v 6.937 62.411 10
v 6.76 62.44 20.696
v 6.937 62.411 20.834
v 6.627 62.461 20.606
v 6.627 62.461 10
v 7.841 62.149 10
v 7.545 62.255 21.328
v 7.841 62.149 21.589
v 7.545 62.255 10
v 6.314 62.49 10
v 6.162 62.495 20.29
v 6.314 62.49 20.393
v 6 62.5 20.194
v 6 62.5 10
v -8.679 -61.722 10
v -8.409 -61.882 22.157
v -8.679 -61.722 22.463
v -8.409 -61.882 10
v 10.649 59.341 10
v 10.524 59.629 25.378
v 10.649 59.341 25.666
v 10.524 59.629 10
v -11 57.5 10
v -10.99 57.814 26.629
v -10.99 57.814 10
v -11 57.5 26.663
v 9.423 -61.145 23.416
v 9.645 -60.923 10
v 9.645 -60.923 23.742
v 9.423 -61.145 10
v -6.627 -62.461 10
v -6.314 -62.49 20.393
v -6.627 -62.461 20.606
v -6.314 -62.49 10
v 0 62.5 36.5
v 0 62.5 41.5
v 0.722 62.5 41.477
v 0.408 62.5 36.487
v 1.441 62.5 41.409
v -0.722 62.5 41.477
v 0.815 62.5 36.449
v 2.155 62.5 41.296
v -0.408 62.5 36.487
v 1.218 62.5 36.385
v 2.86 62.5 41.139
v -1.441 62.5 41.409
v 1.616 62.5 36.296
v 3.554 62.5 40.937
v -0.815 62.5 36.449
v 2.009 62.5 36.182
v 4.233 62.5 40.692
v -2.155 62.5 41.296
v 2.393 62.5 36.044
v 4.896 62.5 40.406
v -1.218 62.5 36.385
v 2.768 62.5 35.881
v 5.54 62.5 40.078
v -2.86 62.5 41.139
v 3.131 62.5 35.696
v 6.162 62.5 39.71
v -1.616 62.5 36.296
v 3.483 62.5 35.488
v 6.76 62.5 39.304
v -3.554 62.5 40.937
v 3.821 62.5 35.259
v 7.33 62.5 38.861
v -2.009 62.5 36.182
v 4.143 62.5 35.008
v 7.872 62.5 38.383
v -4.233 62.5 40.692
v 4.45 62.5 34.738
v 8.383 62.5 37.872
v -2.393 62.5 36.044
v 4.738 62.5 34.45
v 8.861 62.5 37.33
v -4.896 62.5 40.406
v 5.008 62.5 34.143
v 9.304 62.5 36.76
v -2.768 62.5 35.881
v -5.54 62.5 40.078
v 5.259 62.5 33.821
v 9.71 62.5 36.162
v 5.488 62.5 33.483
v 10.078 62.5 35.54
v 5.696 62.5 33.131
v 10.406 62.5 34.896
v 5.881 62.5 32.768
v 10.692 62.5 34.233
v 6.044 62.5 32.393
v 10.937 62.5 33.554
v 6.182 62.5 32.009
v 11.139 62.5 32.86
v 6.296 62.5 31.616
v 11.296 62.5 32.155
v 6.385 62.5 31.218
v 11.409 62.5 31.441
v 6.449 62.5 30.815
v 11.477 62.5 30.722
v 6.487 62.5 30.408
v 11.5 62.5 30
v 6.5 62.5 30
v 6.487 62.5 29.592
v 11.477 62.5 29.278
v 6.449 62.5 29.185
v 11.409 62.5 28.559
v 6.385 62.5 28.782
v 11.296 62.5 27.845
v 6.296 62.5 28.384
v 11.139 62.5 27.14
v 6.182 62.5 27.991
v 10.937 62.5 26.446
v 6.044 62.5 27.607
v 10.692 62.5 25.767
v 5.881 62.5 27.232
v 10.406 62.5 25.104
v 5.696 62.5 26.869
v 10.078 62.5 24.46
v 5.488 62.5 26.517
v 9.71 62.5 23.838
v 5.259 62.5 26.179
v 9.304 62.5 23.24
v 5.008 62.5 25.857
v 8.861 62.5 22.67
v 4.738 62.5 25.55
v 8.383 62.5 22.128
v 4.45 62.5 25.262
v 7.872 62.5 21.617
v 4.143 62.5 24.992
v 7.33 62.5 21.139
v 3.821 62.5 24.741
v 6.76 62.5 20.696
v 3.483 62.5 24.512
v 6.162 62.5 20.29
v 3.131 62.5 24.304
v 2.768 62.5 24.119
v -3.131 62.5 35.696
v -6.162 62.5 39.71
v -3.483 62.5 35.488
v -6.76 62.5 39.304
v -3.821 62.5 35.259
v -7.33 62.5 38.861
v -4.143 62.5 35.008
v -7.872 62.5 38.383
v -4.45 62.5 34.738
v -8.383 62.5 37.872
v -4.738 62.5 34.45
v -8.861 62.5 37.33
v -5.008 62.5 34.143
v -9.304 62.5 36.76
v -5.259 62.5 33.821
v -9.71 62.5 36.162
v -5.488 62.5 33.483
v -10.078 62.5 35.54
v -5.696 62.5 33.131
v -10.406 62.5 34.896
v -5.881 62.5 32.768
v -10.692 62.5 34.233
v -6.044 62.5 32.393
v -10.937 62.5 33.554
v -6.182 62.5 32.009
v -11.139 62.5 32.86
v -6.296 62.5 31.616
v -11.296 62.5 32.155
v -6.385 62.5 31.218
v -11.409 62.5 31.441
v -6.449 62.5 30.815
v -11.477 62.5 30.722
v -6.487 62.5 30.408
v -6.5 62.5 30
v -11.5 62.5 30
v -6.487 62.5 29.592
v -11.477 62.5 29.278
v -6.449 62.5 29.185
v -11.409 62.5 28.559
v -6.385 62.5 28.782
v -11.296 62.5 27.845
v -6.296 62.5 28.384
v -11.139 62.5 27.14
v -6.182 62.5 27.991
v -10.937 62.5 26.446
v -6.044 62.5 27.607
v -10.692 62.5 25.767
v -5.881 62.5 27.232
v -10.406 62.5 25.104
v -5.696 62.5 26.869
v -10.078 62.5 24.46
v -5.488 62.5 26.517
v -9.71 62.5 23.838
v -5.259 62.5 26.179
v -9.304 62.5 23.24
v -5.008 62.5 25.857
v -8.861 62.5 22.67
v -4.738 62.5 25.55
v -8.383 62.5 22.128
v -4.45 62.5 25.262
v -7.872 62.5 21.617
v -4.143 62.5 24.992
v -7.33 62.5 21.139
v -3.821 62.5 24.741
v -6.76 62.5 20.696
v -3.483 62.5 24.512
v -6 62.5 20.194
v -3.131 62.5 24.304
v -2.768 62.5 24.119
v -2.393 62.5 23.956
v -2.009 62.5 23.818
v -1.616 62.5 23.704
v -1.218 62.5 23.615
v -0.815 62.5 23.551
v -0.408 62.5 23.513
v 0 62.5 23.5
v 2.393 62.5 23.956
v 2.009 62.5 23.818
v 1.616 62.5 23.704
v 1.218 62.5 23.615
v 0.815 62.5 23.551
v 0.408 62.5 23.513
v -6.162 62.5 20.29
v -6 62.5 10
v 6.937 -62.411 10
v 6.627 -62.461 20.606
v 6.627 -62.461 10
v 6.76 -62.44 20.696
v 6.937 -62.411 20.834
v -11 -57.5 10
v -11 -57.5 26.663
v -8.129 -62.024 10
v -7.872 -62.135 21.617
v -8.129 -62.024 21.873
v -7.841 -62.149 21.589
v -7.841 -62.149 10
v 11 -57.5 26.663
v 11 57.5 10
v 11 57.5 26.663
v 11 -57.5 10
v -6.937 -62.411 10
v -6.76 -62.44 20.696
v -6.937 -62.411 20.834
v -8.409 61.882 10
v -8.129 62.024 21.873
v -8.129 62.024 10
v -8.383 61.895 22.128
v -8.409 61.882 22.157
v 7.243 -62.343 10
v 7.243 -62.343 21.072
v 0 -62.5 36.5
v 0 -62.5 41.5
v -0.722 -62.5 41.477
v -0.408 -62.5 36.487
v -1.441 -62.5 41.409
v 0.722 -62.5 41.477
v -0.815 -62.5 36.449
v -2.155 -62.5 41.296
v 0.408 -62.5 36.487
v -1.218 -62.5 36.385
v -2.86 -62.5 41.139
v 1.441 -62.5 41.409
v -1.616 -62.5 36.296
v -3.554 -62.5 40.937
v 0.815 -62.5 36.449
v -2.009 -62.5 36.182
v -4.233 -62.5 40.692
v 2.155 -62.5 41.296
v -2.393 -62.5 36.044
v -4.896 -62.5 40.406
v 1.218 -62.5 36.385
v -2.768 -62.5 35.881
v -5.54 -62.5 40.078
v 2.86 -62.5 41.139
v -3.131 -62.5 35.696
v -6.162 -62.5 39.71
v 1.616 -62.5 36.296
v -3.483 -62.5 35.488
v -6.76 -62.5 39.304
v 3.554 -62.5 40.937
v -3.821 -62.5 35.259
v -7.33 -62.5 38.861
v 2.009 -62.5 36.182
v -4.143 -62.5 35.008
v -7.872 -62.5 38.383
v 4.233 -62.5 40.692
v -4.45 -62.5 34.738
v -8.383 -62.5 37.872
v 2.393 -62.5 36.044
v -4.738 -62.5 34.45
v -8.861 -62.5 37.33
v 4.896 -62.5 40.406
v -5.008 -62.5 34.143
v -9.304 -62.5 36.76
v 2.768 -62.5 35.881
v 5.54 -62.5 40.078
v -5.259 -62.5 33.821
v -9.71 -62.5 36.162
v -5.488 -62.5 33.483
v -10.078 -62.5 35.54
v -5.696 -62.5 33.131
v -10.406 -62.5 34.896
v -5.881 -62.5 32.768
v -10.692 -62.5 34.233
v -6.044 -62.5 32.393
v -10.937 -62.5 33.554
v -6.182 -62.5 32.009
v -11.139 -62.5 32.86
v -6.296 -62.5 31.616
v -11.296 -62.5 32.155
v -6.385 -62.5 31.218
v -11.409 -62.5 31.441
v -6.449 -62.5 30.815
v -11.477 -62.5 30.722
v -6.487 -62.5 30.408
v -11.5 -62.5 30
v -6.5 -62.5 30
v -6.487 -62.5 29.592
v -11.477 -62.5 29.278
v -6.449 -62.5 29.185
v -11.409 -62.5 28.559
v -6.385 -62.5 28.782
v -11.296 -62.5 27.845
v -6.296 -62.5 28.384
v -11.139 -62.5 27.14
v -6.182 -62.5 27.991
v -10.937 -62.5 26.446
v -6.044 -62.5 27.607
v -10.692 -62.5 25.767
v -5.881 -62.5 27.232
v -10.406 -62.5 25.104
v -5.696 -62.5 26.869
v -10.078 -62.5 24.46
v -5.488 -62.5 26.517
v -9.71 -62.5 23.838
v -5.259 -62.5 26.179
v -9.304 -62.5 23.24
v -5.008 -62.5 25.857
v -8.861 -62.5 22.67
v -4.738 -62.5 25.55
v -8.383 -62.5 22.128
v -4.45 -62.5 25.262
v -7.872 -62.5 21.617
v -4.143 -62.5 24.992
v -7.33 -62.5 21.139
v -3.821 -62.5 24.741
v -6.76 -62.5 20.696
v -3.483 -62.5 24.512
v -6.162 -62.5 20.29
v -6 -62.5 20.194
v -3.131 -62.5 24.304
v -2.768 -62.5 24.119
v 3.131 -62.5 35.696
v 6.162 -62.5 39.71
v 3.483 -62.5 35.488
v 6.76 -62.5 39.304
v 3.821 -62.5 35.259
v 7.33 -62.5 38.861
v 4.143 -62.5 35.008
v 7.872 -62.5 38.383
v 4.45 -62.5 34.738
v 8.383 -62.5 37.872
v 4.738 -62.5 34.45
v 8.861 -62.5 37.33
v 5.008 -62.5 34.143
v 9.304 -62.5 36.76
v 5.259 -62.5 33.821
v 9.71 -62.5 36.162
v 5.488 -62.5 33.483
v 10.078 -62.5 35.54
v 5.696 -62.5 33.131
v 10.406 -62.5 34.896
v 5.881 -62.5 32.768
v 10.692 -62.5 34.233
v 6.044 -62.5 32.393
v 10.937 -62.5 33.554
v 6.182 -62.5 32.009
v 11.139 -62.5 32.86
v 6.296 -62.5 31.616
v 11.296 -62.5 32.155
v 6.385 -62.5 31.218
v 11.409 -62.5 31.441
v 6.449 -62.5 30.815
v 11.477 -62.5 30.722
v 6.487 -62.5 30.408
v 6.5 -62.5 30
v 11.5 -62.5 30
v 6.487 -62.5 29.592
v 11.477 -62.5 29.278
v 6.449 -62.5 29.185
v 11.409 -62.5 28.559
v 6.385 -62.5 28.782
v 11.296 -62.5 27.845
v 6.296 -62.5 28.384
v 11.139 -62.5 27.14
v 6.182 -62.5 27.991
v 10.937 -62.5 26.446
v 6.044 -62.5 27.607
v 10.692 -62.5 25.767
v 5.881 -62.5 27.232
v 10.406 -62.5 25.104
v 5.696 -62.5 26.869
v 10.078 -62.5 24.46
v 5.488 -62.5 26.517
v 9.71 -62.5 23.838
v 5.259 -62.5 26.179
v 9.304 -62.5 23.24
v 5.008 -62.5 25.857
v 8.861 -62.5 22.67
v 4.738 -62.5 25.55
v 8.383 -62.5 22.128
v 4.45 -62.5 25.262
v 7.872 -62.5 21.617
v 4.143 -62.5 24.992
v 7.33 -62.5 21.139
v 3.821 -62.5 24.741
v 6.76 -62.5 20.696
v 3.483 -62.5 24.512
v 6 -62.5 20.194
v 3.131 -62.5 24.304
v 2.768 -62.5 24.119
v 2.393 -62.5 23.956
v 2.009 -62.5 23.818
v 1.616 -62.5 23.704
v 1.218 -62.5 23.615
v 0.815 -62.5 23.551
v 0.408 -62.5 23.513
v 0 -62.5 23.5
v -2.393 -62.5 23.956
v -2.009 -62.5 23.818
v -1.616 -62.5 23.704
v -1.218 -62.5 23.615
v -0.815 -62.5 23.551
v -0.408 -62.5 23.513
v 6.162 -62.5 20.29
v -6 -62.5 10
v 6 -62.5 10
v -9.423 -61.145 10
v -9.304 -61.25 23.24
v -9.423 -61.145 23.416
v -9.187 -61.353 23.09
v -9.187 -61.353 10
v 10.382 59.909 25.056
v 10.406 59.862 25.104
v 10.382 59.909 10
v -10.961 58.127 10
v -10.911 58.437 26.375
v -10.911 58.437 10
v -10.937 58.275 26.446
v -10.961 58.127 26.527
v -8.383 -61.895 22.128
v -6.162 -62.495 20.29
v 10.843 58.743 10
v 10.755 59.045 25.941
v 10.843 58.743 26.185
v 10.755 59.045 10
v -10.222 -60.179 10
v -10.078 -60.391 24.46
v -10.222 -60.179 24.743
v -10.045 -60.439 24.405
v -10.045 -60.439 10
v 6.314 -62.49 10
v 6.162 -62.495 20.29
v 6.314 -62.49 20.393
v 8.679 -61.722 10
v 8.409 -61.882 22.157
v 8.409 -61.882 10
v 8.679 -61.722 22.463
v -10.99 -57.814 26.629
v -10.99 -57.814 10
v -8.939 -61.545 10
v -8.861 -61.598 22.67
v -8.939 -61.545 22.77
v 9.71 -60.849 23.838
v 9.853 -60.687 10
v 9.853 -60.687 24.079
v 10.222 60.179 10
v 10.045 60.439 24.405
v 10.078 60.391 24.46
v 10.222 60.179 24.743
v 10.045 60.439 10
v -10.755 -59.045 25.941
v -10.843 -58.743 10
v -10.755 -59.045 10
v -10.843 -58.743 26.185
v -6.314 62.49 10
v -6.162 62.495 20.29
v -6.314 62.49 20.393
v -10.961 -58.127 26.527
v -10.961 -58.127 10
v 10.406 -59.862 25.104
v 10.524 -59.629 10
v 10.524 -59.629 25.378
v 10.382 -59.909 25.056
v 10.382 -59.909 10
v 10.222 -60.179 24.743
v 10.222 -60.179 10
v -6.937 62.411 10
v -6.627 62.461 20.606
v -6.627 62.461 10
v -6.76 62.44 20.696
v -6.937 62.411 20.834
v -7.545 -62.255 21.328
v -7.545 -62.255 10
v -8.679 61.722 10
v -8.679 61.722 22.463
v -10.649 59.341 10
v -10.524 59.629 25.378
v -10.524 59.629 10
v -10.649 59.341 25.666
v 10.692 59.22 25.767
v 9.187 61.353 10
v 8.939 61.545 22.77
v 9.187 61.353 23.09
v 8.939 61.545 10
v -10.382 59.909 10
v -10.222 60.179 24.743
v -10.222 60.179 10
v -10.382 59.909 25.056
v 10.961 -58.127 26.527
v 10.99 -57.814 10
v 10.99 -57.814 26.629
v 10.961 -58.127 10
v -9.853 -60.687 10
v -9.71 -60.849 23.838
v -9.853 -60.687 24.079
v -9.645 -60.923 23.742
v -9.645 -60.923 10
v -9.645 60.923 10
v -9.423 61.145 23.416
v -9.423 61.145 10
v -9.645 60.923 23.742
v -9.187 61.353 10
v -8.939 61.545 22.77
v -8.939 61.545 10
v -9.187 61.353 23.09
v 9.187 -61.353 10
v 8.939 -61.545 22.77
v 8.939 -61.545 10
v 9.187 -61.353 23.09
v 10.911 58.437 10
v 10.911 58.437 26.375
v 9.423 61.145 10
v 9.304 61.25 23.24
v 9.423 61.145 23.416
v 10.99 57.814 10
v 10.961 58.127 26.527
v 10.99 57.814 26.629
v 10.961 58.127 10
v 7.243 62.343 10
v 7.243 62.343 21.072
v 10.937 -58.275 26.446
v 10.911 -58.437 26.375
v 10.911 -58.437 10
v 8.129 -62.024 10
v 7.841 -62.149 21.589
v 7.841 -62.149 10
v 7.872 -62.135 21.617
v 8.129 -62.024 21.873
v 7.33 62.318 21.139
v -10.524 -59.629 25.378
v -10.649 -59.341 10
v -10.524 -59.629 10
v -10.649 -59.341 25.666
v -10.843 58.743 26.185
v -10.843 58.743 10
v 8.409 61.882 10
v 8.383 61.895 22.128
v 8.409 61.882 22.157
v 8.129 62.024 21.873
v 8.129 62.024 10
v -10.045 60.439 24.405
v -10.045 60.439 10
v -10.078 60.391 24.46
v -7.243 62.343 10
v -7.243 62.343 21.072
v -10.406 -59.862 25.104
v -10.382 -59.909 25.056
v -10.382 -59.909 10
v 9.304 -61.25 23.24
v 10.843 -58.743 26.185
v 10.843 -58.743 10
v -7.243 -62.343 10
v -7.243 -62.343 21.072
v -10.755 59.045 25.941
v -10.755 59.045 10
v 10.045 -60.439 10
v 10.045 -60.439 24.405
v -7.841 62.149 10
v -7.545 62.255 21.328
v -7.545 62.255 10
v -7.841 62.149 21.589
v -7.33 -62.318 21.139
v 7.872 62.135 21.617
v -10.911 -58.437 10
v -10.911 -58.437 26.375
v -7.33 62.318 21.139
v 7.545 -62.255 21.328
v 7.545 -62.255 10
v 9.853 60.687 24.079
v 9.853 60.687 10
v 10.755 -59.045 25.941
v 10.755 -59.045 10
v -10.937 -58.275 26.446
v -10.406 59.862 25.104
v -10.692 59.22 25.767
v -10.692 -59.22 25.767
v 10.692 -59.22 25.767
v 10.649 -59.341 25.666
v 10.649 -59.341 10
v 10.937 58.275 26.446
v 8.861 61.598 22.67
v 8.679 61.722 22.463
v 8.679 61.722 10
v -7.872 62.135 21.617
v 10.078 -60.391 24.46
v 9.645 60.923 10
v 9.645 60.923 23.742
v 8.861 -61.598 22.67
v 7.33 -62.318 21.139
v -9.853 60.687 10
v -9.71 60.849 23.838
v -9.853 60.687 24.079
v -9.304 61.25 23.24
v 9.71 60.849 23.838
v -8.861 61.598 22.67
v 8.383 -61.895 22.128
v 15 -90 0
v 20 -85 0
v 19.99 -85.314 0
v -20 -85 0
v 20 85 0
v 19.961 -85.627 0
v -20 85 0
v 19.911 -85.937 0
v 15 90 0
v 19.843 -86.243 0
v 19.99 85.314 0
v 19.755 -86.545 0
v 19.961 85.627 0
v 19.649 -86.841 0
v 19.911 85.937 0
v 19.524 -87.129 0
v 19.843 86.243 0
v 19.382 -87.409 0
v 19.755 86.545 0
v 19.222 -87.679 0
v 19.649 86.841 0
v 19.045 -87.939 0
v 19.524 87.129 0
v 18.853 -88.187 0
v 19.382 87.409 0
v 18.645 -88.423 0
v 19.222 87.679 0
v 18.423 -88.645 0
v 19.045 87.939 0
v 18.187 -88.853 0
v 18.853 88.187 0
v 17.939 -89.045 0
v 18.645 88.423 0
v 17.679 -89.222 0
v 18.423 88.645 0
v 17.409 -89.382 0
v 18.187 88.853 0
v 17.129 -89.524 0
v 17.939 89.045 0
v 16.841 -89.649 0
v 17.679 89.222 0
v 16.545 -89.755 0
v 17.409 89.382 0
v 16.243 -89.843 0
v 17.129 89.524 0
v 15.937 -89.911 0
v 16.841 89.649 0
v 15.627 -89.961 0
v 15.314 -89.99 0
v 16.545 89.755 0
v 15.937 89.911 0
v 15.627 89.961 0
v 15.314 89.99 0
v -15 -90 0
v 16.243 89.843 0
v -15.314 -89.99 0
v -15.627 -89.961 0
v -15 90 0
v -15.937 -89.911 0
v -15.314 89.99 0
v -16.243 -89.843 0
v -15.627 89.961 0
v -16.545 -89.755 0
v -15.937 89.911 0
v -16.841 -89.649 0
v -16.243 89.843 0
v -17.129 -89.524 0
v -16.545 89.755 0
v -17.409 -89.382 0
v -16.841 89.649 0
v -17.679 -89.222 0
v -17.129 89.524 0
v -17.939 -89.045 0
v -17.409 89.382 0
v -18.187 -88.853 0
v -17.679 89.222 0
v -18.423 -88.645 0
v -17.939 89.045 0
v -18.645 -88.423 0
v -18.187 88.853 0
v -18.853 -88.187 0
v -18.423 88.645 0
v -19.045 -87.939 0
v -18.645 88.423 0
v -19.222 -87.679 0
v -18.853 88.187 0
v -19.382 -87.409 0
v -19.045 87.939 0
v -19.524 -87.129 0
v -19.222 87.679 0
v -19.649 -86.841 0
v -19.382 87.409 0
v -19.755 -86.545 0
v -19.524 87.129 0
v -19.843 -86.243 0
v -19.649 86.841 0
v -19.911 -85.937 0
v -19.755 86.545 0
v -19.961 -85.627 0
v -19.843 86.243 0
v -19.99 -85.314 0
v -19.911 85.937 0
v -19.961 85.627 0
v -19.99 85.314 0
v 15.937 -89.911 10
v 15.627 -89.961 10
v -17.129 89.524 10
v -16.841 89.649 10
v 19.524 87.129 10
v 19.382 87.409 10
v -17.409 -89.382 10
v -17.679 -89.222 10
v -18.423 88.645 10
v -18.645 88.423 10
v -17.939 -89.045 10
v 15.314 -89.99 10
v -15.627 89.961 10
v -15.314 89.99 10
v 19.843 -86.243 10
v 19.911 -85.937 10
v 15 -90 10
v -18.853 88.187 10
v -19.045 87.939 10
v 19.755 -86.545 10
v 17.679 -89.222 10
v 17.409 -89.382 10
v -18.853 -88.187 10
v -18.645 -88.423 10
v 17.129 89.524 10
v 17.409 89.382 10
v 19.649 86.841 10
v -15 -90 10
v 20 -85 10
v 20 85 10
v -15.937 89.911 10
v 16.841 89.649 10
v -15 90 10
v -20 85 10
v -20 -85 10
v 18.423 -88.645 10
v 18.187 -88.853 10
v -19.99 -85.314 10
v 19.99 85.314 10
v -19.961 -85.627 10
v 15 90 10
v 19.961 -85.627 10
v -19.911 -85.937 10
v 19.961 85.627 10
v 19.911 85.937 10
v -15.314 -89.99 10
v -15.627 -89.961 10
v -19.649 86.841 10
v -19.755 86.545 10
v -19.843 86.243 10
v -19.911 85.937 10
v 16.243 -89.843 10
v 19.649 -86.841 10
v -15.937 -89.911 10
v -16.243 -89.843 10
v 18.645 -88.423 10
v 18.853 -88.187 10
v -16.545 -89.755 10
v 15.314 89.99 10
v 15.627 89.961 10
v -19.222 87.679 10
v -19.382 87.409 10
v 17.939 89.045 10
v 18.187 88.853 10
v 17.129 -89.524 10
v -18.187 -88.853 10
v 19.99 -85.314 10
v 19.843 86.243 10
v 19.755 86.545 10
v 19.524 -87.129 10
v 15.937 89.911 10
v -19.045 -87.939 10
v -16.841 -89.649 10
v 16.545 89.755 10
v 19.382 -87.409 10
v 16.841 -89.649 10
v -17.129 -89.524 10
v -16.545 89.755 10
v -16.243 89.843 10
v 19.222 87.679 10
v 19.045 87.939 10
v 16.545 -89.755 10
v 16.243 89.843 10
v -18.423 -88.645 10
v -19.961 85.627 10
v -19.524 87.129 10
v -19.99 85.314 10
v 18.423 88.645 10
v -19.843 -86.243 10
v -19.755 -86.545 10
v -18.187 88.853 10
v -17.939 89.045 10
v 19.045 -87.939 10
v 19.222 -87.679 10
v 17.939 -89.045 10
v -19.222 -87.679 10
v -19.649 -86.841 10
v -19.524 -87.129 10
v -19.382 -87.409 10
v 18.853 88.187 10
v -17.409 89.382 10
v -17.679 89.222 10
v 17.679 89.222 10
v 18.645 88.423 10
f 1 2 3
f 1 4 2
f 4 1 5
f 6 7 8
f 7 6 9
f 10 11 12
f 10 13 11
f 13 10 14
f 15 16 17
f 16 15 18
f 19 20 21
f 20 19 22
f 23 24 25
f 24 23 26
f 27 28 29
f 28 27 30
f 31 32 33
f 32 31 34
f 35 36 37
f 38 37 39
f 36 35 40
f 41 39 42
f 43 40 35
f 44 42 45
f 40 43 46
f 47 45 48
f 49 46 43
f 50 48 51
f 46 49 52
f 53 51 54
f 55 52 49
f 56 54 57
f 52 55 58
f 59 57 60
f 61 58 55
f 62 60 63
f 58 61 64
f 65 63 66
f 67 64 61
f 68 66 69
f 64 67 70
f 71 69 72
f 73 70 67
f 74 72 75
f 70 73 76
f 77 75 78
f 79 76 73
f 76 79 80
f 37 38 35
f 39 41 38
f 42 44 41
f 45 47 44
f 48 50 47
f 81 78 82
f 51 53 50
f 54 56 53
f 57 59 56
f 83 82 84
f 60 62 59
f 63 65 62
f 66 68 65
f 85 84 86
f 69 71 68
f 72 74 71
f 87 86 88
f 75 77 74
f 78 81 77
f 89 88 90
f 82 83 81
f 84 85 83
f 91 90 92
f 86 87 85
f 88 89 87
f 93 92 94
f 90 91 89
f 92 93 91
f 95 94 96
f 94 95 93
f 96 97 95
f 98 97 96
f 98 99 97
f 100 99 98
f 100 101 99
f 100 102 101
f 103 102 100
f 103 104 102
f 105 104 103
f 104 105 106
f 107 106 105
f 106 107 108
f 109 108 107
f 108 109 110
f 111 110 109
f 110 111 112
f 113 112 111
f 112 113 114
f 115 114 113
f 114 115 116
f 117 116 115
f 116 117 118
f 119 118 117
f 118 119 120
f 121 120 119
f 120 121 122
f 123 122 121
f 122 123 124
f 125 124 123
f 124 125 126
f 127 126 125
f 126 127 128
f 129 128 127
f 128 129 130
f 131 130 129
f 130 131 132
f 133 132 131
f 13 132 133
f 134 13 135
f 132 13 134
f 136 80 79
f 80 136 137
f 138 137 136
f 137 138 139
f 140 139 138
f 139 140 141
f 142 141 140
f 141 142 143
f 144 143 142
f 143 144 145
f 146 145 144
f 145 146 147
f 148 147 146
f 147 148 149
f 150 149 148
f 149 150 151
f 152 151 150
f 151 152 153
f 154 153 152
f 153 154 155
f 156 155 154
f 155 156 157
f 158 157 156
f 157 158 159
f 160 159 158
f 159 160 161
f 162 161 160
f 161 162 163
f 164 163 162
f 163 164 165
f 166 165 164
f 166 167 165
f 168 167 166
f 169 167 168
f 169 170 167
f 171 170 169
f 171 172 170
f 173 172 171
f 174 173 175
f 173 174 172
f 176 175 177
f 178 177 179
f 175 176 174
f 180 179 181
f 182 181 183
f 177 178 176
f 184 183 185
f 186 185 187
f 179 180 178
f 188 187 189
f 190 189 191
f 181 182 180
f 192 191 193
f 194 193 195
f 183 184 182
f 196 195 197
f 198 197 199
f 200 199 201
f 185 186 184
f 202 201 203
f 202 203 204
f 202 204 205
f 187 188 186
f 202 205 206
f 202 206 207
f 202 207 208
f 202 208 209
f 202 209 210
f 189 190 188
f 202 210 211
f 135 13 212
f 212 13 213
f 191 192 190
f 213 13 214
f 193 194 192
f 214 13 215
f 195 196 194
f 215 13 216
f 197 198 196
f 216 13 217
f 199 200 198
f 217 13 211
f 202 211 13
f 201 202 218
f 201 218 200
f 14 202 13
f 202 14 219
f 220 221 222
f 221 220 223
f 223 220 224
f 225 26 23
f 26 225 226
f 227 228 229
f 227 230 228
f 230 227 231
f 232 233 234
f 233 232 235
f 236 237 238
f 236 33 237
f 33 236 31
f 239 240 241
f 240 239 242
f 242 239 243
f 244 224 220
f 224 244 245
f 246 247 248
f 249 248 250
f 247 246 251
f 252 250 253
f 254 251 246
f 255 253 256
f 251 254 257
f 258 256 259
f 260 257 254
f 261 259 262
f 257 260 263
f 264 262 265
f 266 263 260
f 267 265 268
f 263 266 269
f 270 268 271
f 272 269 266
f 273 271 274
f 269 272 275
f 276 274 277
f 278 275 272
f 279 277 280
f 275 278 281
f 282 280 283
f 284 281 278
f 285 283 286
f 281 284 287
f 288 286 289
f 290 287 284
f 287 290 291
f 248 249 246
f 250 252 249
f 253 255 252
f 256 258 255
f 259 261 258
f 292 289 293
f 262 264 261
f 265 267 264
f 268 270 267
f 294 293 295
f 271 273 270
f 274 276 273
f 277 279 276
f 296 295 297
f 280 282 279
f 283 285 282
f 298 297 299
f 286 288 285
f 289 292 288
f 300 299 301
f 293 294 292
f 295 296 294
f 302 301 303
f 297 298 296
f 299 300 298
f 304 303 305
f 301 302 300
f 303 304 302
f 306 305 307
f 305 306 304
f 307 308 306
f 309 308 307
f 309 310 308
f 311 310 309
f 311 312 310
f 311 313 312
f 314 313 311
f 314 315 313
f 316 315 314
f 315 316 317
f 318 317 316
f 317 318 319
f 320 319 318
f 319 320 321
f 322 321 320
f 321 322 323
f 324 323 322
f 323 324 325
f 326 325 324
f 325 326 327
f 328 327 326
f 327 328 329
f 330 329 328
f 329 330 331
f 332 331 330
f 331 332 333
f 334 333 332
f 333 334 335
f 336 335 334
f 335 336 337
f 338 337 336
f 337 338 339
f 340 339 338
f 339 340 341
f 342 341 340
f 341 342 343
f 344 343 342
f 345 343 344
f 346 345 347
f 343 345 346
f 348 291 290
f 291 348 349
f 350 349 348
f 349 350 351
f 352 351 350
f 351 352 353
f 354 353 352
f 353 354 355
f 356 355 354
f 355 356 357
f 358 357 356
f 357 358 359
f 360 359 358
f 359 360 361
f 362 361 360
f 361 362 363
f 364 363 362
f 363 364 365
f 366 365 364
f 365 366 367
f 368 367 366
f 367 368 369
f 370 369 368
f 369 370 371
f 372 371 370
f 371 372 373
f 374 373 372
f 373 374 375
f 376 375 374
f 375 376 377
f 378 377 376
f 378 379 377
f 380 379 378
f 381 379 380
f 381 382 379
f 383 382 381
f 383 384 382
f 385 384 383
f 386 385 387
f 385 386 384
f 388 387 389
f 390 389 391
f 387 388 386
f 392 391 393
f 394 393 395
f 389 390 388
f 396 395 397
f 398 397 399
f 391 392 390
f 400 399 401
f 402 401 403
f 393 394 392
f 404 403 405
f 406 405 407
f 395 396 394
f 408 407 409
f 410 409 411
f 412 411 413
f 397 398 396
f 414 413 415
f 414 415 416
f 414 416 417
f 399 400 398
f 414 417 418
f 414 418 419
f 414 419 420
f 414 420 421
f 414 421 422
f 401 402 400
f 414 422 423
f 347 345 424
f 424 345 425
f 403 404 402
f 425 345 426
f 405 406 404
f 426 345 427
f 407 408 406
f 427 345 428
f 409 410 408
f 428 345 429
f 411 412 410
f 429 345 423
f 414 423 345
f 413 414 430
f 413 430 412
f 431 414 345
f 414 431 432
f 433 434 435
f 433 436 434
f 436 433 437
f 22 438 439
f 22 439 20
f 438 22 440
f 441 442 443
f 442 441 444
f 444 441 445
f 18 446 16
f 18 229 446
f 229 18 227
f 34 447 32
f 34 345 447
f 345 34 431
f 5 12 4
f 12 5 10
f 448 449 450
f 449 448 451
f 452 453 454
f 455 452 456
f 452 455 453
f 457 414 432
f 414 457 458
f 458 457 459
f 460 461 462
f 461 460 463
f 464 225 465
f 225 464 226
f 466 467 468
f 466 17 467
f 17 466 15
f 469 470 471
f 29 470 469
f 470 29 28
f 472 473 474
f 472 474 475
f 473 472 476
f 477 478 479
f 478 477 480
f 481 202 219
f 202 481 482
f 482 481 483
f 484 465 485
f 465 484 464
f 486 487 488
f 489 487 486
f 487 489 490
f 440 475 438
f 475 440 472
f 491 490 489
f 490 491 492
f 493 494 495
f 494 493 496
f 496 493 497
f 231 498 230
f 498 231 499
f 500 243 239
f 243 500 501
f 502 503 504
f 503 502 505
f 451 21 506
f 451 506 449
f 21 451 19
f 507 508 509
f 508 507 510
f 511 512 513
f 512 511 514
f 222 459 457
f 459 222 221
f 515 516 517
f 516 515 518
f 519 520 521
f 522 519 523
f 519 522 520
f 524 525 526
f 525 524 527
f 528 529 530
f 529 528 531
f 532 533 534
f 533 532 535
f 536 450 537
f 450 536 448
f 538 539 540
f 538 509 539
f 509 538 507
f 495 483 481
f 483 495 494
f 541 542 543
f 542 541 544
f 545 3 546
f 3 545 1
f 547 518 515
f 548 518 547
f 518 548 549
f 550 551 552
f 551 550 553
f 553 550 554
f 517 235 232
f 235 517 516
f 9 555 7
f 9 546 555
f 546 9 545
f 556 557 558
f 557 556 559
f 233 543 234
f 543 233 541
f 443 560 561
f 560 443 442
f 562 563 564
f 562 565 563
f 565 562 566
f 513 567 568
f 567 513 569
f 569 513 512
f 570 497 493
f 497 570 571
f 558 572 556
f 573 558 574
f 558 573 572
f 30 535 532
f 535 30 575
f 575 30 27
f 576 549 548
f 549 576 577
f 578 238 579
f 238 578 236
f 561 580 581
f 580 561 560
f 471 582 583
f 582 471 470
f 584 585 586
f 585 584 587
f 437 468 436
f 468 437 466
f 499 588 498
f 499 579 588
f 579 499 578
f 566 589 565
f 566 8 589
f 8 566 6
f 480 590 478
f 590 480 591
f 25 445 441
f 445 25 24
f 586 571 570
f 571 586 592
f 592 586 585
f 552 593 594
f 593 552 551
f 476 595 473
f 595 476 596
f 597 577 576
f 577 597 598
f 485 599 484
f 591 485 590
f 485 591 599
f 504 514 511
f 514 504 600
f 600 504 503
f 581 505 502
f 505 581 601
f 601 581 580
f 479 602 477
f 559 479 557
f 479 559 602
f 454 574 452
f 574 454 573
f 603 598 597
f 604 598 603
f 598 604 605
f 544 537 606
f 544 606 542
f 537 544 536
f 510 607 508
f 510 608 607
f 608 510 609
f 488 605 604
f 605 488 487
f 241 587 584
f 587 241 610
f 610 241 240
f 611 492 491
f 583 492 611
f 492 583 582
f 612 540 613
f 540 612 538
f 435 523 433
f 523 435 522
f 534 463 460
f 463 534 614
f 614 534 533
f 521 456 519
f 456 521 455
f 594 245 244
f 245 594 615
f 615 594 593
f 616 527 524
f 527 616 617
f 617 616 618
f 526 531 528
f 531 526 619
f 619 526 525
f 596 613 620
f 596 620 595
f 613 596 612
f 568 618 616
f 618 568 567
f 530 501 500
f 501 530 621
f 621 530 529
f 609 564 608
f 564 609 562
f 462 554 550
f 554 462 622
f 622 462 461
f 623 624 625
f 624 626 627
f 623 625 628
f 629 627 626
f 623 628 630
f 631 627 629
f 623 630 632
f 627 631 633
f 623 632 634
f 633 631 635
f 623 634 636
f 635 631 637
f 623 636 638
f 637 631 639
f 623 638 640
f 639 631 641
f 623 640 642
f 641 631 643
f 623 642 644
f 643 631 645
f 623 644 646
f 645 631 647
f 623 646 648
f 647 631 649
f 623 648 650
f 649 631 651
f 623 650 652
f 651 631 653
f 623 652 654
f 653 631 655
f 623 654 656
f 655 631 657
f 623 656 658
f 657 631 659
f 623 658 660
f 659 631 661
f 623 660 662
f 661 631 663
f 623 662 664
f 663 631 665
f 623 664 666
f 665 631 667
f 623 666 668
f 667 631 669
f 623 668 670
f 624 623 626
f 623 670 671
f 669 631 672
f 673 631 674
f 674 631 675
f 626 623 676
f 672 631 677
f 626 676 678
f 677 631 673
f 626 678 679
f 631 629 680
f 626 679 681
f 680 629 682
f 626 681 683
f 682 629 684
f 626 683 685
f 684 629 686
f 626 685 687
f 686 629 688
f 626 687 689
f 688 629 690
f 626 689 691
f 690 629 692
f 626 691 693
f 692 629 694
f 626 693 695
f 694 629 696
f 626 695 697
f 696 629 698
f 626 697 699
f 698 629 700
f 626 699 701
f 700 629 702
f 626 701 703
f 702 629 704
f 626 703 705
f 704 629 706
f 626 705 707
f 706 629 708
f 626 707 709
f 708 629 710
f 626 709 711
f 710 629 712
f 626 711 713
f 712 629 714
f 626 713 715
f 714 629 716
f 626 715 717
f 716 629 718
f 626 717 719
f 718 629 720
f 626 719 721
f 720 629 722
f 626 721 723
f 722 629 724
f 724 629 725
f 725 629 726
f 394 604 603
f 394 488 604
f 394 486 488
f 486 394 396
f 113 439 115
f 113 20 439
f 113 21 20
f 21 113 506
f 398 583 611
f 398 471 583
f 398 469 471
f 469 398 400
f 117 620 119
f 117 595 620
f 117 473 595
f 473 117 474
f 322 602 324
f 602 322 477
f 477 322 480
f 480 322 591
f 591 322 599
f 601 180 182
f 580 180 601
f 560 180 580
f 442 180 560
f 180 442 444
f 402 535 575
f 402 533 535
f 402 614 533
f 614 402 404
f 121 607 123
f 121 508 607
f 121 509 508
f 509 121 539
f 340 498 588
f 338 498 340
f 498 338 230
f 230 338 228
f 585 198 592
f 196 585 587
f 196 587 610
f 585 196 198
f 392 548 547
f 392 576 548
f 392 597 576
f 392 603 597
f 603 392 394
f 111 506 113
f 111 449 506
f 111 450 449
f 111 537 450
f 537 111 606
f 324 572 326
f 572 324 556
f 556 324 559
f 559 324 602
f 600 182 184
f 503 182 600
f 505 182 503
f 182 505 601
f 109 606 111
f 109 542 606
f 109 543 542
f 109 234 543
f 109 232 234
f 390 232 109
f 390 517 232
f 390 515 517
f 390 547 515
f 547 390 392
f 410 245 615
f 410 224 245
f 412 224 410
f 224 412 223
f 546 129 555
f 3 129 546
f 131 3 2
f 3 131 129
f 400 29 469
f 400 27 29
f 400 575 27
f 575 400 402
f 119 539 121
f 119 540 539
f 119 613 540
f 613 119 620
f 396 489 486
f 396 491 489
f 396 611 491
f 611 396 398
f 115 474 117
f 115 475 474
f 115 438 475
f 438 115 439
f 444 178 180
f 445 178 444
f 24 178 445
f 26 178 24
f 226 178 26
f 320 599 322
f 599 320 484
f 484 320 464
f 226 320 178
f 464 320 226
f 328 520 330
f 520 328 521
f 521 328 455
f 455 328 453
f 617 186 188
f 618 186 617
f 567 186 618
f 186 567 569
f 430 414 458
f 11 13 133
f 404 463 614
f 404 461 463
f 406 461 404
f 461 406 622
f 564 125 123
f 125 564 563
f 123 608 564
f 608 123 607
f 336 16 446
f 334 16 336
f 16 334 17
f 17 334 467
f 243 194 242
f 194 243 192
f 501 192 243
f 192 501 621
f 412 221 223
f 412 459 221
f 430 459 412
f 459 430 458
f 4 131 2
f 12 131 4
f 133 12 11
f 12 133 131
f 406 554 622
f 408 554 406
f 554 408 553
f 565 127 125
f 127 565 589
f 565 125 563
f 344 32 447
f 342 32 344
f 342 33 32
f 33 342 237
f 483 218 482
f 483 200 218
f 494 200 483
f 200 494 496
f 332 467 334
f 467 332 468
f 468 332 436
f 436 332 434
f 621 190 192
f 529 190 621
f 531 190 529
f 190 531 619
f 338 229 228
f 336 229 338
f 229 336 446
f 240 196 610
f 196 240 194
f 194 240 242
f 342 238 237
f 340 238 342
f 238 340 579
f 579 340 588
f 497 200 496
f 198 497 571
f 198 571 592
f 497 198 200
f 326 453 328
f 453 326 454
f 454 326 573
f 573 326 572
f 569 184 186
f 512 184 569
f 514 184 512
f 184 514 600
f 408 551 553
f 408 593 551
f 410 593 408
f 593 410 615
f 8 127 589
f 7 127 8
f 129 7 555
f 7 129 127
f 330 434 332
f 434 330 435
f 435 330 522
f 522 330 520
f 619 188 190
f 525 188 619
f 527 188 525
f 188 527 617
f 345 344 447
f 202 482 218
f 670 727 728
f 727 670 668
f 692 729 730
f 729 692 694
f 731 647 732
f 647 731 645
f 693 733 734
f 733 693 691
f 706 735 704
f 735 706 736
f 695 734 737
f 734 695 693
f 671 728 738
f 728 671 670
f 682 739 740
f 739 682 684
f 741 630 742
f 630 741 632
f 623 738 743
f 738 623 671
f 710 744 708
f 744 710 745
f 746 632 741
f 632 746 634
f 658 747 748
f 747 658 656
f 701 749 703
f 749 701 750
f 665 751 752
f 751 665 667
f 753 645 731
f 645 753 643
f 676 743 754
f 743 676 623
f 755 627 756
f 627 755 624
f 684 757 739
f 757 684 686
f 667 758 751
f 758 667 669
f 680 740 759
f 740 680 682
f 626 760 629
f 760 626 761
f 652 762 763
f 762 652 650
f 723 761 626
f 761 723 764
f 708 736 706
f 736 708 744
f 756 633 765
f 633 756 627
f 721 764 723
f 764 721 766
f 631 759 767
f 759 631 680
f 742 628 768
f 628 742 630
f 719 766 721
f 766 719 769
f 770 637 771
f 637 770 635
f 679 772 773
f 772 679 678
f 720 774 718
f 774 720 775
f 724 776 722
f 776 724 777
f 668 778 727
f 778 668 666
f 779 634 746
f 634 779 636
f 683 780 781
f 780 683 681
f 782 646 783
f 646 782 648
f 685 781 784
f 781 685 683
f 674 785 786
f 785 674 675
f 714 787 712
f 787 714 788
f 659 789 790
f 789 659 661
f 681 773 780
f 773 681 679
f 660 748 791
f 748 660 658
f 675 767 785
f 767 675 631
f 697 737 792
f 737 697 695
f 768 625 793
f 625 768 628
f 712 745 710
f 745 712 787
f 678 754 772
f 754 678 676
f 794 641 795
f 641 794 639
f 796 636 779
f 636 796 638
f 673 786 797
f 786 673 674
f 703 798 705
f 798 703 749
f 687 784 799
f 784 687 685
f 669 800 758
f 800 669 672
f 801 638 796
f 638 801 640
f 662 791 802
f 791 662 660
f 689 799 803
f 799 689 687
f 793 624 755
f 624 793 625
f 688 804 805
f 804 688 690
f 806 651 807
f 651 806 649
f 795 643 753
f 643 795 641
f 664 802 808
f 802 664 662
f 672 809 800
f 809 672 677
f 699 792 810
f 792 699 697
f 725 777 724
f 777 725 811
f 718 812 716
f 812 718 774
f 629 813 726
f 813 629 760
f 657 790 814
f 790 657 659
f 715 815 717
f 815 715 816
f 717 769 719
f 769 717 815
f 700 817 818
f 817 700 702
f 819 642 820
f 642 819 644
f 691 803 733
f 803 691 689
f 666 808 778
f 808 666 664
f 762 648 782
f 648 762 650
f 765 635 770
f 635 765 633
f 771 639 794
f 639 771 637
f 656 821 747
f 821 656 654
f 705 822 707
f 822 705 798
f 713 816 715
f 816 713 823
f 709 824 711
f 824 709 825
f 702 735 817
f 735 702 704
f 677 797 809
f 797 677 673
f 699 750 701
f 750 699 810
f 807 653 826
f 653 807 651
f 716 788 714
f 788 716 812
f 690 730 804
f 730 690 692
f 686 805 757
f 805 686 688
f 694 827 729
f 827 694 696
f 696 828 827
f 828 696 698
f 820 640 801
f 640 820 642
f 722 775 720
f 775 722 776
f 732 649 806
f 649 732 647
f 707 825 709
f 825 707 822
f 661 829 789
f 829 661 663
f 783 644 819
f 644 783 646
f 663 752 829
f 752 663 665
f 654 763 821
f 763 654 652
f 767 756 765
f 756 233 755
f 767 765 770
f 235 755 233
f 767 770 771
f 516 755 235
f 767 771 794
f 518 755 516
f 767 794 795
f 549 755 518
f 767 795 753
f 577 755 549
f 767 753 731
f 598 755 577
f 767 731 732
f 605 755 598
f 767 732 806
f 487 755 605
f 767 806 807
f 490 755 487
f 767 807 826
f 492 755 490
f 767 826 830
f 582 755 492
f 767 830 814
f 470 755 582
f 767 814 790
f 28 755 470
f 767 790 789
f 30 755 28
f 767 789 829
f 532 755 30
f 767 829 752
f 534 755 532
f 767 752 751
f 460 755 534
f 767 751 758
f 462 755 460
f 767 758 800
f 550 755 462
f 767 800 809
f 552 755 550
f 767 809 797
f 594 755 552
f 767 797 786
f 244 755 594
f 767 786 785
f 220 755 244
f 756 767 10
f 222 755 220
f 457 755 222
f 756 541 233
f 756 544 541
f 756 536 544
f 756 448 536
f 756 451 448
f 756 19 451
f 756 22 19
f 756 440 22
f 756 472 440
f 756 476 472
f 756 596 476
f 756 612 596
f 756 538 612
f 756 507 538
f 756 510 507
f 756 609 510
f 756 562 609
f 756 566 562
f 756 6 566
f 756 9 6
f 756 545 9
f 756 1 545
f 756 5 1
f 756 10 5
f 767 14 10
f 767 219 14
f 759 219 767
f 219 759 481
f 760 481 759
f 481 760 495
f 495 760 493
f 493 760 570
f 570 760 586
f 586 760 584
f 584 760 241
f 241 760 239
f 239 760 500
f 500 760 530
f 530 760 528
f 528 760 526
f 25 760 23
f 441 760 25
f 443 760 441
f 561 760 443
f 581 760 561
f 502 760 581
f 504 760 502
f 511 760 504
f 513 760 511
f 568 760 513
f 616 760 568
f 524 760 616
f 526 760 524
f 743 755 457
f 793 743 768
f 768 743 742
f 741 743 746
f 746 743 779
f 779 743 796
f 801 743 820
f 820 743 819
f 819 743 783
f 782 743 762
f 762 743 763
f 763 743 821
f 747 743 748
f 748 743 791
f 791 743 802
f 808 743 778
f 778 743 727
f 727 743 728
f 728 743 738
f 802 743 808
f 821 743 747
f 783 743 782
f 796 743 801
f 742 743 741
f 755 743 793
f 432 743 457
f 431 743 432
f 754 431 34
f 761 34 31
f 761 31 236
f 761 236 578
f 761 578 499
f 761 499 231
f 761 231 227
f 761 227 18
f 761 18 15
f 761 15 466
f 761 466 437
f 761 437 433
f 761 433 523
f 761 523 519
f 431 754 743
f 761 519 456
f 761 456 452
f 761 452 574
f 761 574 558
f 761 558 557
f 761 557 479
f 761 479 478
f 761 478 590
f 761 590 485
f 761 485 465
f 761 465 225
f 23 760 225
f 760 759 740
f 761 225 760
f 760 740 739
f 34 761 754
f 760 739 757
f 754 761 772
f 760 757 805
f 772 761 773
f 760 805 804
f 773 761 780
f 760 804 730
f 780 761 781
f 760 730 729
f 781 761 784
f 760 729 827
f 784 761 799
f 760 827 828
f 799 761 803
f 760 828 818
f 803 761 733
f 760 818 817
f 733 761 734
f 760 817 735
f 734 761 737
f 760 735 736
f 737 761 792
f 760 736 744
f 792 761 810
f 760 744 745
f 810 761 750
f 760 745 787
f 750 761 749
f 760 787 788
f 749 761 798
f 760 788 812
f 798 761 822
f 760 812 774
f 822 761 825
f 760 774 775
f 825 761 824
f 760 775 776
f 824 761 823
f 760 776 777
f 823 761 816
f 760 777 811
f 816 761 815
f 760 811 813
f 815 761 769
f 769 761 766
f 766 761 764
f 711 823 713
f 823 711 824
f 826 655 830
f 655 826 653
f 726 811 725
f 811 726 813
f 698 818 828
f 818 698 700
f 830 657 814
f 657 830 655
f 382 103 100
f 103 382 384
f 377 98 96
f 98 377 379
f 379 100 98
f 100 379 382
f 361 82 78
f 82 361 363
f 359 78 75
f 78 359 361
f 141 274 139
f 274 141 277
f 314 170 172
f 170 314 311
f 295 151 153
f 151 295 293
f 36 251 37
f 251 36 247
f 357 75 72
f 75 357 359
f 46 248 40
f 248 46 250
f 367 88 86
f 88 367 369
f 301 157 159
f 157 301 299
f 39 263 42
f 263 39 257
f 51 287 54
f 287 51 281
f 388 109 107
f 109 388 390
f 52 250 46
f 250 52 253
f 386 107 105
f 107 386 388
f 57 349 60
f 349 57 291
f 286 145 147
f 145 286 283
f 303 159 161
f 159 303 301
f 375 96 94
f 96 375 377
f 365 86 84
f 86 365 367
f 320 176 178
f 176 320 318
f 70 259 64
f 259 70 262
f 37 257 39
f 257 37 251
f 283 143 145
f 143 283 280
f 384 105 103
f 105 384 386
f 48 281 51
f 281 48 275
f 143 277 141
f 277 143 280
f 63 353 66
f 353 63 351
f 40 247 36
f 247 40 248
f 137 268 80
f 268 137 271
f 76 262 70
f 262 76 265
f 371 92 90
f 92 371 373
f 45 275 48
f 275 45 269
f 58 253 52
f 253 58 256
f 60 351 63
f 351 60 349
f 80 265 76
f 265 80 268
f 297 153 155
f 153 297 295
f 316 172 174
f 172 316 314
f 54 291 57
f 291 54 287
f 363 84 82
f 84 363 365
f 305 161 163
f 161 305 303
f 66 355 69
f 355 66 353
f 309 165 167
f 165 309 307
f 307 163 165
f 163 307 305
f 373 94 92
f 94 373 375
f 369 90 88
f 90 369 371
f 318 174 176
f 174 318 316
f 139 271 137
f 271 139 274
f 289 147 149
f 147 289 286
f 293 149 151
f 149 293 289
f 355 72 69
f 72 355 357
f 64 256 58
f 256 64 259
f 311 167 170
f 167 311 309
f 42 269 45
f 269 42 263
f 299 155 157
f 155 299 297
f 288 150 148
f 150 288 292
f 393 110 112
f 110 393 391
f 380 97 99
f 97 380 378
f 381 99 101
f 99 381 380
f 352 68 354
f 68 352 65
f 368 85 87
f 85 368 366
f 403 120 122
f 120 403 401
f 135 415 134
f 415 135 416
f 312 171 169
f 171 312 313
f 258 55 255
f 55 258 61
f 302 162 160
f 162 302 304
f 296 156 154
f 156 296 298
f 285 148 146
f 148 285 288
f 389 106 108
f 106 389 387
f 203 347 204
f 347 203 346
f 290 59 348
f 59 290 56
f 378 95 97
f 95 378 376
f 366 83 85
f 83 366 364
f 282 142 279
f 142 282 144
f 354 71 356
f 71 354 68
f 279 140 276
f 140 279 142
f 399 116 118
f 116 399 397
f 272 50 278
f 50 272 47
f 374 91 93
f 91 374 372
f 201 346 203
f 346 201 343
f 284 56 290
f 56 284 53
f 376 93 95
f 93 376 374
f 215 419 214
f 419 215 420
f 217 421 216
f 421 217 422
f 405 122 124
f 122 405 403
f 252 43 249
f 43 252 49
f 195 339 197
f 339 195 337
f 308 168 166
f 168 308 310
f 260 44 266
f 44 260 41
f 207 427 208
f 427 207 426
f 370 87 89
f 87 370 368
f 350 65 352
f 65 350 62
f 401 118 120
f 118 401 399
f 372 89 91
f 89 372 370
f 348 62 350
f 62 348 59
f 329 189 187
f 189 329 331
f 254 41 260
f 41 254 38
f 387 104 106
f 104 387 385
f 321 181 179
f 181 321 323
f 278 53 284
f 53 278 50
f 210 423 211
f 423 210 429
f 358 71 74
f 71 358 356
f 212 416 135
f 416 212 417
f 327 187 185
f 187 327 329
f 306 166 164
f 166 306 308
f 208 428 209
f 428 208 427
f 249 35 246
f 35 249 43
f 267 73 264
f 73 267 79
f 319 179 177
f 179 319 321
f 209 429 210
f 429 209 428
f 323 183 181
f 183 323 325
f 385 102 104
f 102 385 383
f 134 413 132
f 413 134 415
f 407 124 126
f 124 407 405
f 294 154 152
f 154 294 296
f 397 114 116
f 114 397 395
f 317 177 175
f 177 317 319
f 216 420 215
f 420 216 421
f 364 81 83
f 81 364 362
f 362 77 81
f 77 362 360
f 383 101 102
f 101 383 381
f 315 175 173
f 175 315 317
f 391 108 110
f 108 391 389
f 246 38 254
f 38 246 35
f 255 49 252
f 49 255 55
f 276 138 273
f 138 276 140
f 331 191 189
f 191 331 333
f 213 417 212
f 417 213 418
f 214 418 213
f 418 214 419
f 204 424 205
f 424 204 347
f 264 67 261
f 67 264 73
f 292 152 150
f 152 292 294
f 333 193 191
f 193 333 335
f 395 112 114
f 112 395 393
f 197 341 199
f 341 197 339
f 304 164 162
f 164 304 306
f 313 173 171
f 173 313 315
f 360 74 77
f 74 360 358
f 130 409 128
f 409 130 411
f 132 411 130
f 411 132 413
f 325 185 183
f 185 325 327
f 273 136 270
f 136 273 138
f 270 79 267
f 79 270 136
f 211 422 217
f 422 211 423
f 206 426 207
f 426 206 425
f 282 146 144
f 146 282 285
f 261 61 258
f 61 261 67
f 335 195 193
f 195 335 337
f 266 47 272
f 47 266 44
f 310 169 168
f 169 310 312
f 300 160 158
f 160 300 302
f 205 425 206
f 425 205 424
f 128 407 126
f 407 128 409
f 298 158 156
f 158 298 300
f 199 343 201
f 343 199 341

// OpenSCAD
axel_diameter=12;
axel_diameter_tolernace=1;
axle_width=125;
base_height = 10;
base_width = 180;
base_depth = 40;
support_depth = 22;
support_relative_to_base_height = 40;
gap=0;

/* [Hidden] */
$fn=100;
r=5;
d=axel_diameter + axel_diameter_tolernace;


_base_width = base_width - 2*r;
_base_depth = base_depth - 2*r;
_support_depth = support_depth - 2*r;
_support_height = support_relative_to_base_height + base_height;
_support_width = axle_width-2*r;

difference() {
    union() {
        linear_extrude(base_height)
        offset(r)
        square([_base_depth,_base_width], center=true);

    difference(){
        linear_extrude(30)
        offset(r)
        square([_support_depth, _support_width],center = true);
        
        translate([0,0,base_height + support_relative_to_base_height /2])
        rotate([90])
        cylinder(_base_width+2*r, d=d+10, center=true);

    }
        
        translate([0,0,base_height + support_relative_to_base_height /2])
        rotate([90])
        cylinder(axle_width, d=d+10, center=true);
    }

    union(){
        translate([0,0,base_height + support_relative_to_base_height /2])
        rotate([90])
        cylinder(_base_width+2*r, d=d, center=true);
        
        translate([0,0,base_height + _support_height/2])
        cube([_base_width, gap, _support_height], center=true);
    }
}
